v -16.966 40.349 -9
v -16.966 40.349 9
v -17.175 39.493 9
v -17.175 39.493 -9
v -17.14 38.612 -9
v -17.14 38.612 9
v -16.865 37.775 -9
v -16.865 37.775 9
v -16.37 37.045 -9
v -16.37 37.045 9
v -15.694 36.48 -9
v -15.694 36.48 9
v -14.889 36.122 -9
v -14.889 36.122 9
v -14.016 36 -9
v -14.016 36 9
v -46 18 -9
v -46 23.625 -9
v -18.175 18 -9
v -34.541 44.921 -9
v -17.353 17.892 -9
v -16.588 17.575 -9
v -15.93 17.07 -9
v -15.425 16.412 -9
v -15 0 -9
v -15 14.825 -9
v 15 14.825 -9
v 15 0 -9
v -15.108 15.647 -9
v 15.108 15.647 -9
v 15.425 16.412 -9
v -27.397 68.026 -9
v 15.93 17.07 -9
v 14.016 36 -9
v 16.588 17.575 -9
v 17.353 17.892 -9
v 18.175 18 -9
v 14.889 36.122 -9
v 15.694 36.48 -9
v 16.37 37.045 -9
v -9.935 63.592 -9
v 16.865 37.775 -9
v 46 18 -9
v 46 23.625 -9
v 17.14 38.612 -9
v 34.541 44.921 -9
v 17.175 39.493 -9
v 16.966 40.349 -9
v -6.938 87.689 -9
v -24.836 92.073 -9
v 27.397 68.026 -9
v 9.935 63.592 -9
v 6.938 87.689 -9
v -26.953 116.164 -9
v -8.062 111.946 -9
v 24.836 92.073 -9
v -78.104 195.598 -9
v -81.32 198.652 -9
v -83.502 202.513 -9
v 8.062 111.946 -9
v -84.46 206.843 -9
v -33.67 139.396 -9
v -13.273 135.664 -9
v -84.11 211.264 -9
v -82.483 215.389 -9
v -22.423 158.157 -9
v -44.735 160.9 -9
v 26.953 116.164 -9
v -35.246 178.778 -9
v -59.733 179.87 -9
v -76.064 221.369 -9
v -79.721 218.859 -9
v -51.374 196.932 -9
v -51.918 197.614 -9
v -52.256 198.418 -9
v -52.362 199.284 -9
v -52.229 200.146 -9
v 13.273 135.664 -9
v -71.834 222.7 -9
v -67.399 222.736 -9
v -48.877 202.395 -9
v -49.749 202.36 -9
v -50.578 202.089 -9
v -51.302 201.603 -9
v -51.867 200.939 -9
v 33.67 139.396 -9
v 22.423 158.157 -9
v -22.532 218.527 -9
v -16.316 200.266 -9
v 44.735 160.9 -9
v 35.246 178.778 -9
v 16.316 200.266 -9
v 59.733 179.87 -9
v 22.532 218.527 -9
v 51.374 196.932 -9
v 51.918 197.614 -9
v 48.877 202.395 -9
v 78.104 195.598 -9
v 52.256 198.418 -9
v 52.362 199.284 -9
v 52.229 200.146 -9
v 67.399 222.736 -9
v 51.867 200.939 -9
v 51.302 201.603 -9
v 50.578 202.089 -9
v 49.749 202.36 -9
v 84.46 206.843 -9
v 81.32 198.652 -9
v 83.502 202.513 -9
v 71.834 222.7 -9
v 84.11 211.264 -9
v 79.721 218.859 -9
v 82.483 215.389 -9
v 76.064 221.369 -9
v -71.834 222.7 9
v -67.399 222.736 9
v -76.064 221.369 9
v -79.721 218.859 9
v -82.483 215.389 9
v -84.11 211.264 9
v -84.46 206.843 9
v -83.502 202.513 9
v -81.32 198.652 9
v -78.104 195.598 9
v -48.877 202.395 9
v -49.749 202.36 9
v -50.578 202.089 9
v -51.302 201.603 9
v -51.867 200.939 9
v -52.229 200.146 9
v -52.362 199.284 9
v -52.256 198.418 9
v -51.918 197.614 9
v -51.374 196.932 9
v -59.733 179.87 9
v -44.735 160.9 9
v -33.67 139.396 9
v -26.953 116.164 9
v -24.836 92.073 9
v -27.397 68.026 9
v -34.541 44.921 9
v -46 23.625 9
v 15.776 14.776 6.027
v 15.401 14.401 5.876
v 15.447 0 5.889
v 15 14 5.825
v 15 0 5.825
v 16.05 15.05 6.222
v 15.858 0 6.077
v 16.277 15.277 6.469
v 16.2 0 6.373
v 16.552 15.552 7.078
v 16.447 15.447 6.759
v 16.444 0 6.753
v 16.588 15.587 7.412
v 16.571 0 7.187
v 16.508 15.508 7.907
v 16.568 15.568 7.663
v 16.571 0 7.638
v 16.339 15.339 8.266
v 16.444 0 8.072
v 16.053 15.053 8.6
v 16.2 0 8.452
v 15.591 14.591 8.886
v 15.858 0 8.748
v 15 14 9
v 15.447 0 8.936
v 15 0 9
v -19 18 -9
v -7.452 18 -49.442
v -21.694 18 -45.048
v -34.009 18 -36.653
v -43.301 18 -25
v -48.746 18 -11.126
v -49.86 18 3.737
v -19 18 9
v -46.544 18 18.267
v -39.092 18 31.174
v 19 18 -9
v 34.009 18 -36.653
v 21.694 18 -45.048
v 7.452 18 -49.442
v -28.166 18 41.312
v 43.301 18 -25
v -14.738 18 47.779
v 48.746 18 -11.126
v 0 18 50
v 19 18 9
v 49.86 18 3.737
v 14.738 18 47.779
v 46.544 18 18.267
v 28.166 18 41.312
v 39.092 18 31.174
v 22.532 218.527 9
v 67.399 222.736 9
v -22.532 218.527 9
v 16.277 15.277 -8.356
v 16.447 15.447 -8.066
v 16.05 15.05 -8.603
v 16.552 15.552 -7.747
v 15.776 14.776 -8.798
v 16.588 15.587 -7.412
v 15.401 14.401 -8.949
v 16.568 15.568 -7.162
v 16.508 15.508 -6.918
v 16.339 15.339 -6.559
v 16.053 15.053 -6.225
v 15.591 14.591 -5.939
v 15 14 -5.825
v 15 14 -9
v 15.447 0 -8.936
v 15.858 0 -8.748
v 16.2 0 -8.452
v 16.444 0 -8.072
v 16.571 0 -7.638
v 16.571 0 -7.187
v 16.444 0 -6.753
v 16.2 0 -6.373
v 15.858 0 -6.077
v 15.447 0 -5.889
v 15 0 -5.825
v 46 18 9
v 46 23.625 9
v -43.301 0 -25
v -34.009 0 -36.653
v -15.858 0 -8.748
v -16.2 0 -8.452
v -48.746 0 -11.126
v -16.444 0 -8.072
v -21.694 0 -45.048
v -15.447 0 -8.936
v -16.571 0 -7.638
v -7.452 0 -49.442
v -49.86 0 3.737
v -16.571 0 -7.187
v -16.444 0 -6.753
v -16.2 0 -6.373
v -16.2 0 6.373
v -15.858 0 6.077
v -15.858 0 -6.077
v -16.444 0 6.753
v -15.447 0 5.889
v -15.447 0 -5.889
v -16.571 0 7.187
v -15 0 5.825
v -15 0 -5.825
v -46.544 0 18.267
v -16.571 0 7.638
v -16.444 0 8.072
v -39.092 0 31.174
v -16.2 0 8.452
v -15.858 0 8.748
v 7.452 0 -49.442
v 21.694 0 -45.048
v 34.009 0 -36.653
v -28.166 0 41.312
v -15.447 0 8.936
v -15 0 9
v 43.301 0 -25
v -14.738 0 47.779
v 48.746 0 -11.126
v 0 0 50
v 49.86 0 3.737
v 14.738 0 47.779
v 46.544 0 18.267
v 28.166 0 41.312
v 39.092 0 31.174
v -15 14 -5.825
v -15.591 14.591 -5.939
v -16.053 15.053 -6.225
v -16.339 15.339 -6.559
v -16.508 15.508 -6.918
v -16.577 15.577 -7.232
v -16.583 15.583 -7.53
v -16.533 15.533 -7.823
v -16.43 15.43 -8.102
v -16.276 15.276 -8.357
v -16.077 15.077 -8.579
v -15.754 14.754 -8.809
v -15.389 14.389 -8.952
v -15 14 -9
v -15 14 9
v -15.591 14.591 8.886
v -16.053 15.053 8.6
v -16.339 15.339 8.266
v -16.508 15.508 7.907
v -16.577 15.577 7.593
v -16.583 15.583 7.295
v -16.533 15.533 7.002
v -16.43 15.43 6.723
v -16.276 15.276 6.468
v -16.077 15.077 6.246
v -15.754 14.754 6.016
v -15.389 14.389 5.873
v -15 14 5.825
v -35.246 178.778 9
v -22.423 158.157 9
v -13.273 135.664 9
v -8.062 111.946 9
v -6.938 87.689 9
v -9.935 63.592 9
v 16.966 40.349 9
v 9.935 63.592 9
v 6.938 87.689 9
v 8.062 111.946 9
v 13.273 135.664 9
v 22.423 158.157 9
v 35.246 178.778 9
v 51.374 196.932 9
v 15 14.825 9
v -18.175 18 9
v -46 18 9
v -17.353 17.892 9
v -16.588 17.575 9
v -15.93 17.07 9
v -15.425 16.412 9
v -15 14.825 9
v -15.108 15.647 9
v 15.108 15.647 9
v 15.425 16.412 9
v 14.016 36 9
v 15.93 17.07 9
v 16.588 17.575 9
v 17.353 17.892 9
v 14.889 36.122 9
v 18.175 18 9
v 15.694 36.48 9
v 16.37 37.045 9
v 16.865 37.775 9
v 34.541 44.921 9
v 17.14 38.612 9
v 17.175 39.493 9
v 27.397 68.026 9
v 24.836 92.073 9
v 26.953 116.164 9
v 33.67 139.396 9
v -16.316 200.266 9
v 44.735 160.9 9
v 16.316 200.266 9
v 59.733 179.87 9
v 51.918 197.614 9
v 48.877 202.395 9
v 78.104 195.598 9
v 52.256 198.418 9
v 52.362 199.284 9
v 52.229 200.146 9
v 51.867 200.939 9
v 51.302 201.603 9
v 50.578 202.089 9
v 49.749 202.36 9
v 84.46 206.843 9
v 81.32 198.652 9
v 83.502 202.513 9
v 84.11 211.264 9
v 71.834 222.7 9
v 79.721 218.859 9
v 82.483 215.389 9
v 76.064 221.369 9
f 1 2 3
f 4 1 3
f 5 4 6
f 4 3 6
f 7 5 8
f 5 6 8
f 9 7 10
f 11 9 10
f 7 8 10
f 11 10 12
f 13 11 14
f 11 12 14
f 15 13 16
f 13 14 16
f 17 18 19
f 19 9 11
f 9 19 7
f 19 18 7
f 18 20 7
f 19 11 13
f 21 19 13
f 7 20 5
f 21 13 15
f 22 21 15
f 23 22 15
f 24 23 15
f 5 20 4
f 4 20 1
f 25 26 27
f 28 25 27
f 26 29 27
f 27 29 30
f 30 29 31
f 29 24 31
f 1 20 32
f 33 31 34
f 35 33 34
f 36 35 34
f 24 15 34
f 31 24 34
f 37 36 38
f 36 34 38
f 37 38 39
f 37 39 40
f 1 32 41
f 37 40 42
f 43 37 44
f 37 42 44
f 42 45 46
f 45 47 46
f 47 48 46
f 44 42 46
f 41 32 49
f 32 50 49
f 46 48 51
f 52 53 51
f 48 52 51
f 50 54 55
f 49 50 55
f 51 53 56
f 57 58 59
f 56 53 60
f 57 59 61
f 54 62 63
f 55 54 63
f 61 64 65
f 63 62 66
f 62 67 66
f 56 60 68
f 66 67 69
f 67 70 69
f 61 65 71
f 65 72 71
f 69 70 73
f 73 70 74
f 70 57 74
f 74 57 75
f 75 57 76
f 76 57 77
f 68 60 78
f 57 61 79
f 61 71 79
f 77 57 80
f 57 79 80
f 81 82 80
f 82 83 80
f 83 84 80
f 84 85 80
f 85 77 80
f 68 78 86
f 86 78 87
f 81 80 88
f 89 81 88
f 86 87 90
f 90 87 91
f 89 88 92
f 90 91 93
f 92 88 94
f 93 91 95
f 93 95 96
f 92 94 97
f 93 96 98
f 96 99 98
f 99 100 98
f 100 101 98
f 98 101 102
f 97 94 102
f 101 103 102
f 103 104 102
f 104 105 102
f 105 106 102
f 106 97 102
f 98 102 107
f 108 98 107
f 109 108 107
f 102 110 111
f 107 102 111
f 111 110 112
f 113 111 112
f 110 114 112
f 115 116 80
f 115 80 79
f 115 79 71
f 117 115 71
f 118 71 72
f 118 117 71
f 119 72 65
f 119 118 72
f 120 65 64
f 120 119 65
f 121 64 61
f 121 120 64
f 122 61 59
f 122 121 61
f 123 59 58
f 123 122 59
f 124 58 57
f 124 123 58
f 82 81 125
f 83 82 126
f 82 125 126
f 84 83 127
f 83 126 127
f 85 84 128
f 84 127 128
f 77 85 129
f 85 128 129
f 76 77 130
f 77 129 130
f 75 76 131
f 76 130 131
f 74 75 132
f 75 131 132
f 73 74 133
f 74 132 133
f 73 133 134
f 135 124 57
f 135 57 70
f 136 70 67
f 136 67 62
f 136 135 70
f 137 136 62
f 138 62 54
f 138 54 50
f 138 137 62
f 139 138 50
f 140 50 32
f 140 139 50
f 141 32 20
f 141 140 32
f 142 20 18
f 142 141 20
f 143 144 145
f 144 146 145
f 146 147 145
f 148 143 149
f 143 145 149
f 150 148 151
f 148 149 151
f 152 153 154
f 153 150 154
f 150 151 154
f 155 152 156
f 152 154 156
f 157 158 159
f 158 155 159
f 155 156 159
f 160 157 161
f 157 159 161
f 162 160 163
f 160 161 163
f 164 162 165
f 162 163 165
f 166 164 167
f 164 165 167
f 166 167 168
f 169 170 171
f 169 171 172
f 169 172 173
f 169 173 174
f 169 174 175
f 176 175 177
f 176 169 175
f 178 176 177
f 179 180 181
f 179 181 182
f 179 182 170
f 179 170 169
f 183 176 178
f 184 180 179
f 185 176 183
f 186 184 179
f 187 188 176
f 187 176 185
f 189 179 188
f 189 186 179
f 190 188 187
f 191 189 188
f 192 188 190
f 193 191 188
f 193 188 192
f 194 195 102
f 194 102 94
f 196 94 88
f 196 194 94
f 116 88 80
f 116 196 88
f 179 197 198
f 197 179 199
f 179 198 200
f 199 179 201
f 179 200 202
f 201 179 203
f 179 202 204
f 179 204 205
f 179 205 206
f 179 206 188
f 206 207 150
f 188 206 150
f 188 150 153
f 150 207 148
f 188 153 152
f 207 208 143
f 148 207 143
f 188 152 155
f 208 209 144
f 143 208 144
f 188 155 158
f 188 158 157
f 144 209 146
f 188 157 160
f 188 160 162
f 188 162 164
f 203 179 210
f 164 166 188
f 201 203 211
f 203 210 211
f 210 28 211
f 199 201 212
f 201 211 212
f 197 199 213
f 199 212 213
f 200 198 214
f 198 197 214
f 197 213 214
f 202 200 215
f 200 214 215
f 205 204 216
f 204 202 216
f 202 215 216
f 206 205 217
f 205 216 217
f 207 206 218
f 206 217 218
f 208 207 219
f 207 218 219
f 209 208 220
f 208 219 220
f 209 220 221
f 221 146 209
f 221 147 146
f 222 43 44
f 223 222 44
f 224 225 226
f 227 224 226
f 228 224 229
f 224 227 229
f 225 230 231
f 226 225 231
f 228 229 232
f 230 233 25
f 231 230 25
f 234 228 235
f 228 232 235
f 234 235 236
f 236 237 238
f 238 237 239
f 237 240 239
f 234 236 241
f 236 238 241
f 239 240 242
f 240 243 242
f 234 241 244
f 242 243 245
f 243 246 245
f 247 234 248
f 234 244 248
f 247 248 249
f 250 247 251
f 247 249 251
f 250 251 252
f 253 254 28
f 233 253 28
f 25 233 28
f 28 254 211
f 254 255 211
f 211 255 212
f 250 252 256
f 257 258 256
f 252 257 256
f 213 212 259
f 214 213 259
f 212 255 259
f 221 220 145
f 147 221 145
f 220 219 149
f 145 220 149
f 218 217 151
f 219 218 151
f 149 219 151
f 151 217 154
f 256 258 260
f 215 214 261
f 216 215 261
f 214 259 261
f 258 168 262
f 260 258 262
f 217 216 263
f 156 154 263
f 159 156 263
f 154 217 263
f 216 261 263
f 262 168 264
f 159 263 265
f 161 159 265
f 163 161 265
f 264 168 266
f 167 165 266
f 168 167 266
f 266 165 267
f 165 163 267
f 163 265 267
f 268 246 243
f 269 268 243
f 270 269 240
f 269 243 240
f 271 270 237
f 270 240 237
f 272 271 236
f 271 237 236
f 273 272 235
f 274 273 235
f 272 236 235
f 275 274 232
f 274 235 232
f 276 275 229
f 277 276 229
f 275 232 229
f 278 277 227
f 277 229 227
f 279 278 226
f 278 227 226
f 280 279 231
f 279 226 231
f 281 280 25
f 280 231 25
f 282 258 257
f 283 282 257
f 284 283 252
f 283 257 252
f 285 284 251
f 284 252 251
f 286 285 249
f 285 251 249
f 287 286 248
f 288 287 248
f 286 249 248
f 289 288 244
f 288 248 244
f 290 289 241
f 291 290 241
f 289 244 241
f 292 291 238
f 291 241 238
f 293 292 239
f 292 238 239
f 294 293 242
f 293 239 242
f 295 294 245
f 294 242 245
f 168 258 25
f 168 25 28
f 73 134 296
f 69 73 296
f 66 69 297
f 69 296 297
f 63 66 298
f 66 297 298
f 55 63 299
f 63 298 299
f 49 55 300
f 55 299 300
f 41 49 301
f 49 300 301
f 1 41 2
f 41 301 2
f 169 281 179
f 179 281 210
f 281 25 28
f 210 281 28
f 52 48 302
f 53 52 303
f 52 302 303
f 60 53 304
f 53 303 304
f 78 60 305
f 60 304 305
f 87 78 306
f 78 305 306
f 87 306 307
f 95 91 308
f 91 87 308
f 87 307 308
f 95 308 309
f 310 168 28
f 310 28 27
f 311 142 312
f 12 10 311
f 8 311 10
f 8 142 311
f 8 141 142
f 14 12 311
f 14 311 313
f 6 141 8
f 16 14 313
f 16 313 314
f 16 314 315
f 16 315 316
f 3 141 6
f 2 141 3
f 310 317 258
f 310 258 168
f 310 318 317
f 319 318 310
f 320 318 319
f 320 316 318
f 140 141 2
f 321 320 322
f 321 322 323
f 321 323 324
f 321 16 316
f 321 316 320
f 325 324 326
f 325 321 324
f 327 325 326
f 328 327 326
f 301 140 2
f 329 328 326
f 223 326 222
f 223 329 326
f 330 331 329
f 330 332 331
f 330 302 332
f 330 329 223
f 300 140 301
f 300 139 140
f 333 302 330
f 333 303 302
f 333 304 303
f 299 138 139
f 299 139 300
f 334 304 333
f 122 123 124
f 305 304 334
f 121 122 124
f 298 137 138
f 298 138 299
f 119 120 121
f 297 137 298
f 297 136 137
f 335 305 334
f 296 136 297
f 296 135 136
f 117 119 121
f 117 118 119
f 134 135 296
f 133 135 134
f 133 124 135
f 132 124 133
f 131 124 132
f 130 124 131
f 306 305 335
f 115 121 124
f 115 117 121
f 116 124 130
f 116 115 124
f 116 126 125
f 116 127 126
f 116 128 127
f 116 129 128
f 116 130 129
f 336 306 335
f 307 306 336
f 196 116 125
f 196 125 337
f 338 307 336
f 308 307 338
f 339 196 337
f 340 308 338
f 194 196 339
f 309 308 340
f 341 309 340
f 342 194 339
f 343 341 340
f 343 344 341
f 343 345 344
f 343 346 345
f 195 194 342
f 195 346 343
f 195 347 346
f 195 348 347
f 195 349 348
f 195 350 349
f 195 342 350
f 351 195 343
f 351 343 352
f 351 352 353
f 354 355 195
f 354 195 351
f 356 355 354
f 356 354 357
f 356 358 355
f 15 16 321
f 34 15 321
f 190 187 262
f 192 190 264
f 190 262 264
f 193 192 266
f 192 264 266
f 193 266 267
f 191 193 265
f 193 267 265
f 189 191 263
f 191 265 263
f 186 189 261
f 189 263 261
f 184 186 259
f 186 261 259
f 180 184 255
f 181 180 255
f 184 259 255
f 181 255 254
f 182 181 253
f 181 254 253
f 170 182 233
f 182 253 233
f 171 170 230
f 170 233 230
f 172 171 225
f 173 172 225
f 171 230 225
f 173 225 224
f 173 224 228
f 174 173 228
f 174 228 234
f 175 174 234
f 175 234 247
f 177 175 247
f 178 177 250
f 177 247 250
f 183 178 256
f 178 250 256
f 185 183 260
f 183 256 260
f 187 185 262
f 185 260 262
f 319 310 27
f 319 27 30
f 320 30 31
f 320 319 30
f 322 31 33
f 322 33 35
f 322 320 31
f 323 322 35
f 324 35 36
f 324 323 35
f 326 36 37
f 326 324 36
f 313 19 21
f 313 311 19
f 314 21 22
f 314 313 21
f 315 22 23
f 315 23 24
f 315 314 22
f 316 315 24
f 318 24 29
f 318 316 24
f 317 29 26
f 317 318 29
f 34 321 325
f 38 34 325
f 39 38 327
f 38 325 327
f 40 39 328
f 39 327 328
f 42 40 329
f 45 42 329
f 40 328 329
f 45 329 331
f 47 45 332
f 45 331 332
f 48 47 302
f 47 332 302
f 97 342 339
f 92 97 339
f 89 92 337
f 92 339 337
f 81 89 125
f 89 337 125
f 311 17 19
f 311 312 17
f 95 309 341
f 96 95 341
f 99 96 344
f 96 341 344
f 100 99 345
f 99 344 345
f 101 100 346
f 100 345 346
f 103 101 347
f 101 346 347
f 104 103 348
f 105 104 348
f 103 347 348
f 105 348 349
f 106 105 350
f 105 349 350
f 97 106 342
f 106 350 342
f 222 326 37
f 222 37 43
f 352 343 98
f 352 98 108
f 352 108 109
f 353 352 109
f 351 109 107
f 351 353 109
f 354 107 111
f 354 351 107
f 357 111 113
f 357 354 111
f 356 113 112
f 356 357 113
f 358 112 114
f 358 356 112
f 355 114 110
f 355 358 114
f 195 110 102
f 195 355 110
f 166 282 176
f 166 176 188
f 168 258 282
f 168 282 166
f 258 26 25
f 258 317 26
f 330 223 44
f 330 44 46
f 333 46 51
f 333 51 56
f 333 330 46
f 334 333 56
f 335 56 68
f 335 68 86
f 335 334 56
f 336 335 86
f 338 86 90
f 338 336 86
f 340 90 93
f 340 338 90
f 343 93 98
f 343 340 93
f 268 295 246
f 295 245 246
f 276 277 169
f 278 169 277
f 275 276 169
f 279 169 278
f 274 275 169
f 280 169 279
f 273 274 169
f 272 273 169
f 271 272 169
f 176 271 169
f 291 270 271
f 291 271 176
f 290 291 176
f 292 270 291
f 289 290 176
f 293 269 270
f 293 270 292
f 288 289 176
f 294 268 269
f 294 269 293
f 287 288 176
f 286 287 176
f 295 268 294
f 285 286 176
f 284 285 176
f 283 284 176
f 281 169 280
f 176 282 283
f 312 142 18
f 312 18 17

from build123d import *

# Parameters (mm, degrees)
SKETCH2_R               = 50
BOSS_EXTRUDE1_DEPTH     = 18
BOSS_EXTRUDE2_DEPTH     = 9
CUT_EXTRUDE1_DEPTH      = 246.555378534
CUT_EXTRUDE2_DEPTH      = 228.193000482
CUT_EXTRUDE2_DEPTH_BACK = 228.193000482
SKETCH5_W               = 30
SKETCH5_H               = 18
CHAMFER1_SIZE           = 4
SKETCH6_R               = 1.5875
CUT_EXTRUDE3_DEPTH      = 18


with BuildPart() as part:
    # Sketch2 → Boss-Extrude1 (new body)
    with BuildSketch(Plane(origin=(0, 0, 0), x_dir=(1, 0, 0), z_dir=(0, 1, 0))):
        with Locations(Location((0, 0, 0), (0, 0, 270))):
            Circle(SKETCH2_R)
    extrude(amount=BOSS_EXTRUDE1_DEPTH)

    # Sketch5 → Cut-Extrude2 (cut, two sides: drawn at the far end of the back side and taken through both)
    with BuildSketch(Plane(origin=(0, 18, 0), x_dir=(1, 0, 0), z_dir=(0, 1, 0)).offset(-CUT_EXTRUDE2_DEPTH_BACK)):
        Rectangle(SKETCH5_W, SKETCH5_H)
    extrude(amount=CUT_EXTRUDE2_DEPTH + CUT_EXTRUDE2_DEPTH_BACK, mode=Mode.SUBTRACT)

    # Chamfer1
    chamfer1_edges = [part.edges().sort_by_distance(p)[0] for p in [
        (15, 18, 0),
        (-15, 18, 0),
    ]]
    chamfer(chamfer1_edges, length=CHAMFER1_SIZE)

    # Sketch6 → Cut-Extrude3 (cut)
    with BuildSketch(Plane.XZ):
        with Locations((-15, 7.4125)):
            Circle(SKETCH6_R)
        with Locations((-15, -7.4125)):
            Circle(SKETCH6_R)
        with Locations((15, 7.4125)):
            Circle(SKETCH6_R)
        with Locations((15, -7.4125)):
            Circle(SKETCH6_R)
    extrude(amount=-CUT_EXTRUDE3_DEPTH, mode=Mode.SUBTRACT)


with BuildPart() as body_2:
    # Sketch3 → Boss-Extrude2 (new, symmetric)
    with BuildSketch(Plane.XY):
        with BuildLine():
            Line((-15, 14.825), (-15, 0))
            Line((-15, 0), (15, 0))
            Line((15, 0), (15, 14.825))
            ThreePointArc((15, 14.825), (15.92993597, 17.07006403), (18.175, 18))
            Line((18.175, 18), (46, 18))
            Line((46, 18), (46, 23.625028594))
            ThreePointArc((46, 23.625028594), (26.95349395, 116.163705067), (78.103728943, 195.598140272))
            ThreePointArc((78.103728943, 195.598140272), (83.450113872, 213.387105329), (67.399006159, 222.735530373))
            ThreePointArc((67.399006159, 222.735530373), (0, 218), (-67.399006159, 222.735530373))
            ThreePointArc((-67.399006159, 222.735530373), (-83.450113872, 213.387105329), (-78.103728943, 195.598140272))
            ThreePointArc((-78.103728943, 195.598140272), (-26.95349395, 116.163705067), (-46, 23.625028594))
            Line((-46, 23.625028594), (-46, 18))
            Line((-46, 18), (-18.175, 18))
            ThreePointArc((-18.175, 18), (-15.92993597, 17.07006403), (-15, 14.825))
        make_face()
    extrude(amount=BOSS_EXTRUDE2_DEPTH, both=True)

    # Sketch4 → Cut-Extrude1 (cut, through all)
    with BuildSketch(Plane.XY.offset(9)):
        with BuildLine():
            Line((-14.015756856, 36), (14.015756856, 36))
            ThreePointArc((14.015756856, 36), (16.643309774, 37.392700737), (16.965732055, 40.348998009))
            ThreePointArc((16.965732055, 40.348998009), (10.163023785, 123.915915071), (51.373576105, 196.932329968))
            ThreePointArc((51.373576105, 196.932329968), (52.075271601, 200.554653383), (48.877181189, 202.394713494))
            ThreePointArc((48.877181189, 202.394713494), (0, 200), (-48.877181189, 202.394713494))
            ThreePointArc((-48.877181189, 202.394713494), (-52.075271601, 200.554653383), (-51.373576105, 196.932329968))
            ThreePointArc((-51.373576105, 196.932329968), (-10.163023785, 123.915915071), (-16.965732055, 40.348998009))
            ThreePointArc((-16.965732055, 40.348998009), (-16.643309774, 37.392700737), (-14.015756856, 36))
        make_face()
    extrude(amount=-CUT_EXTRUDE1_DEPTH, mode=Mode.SUBTRACT)


solid = Compound([part.part, body_2.part])
